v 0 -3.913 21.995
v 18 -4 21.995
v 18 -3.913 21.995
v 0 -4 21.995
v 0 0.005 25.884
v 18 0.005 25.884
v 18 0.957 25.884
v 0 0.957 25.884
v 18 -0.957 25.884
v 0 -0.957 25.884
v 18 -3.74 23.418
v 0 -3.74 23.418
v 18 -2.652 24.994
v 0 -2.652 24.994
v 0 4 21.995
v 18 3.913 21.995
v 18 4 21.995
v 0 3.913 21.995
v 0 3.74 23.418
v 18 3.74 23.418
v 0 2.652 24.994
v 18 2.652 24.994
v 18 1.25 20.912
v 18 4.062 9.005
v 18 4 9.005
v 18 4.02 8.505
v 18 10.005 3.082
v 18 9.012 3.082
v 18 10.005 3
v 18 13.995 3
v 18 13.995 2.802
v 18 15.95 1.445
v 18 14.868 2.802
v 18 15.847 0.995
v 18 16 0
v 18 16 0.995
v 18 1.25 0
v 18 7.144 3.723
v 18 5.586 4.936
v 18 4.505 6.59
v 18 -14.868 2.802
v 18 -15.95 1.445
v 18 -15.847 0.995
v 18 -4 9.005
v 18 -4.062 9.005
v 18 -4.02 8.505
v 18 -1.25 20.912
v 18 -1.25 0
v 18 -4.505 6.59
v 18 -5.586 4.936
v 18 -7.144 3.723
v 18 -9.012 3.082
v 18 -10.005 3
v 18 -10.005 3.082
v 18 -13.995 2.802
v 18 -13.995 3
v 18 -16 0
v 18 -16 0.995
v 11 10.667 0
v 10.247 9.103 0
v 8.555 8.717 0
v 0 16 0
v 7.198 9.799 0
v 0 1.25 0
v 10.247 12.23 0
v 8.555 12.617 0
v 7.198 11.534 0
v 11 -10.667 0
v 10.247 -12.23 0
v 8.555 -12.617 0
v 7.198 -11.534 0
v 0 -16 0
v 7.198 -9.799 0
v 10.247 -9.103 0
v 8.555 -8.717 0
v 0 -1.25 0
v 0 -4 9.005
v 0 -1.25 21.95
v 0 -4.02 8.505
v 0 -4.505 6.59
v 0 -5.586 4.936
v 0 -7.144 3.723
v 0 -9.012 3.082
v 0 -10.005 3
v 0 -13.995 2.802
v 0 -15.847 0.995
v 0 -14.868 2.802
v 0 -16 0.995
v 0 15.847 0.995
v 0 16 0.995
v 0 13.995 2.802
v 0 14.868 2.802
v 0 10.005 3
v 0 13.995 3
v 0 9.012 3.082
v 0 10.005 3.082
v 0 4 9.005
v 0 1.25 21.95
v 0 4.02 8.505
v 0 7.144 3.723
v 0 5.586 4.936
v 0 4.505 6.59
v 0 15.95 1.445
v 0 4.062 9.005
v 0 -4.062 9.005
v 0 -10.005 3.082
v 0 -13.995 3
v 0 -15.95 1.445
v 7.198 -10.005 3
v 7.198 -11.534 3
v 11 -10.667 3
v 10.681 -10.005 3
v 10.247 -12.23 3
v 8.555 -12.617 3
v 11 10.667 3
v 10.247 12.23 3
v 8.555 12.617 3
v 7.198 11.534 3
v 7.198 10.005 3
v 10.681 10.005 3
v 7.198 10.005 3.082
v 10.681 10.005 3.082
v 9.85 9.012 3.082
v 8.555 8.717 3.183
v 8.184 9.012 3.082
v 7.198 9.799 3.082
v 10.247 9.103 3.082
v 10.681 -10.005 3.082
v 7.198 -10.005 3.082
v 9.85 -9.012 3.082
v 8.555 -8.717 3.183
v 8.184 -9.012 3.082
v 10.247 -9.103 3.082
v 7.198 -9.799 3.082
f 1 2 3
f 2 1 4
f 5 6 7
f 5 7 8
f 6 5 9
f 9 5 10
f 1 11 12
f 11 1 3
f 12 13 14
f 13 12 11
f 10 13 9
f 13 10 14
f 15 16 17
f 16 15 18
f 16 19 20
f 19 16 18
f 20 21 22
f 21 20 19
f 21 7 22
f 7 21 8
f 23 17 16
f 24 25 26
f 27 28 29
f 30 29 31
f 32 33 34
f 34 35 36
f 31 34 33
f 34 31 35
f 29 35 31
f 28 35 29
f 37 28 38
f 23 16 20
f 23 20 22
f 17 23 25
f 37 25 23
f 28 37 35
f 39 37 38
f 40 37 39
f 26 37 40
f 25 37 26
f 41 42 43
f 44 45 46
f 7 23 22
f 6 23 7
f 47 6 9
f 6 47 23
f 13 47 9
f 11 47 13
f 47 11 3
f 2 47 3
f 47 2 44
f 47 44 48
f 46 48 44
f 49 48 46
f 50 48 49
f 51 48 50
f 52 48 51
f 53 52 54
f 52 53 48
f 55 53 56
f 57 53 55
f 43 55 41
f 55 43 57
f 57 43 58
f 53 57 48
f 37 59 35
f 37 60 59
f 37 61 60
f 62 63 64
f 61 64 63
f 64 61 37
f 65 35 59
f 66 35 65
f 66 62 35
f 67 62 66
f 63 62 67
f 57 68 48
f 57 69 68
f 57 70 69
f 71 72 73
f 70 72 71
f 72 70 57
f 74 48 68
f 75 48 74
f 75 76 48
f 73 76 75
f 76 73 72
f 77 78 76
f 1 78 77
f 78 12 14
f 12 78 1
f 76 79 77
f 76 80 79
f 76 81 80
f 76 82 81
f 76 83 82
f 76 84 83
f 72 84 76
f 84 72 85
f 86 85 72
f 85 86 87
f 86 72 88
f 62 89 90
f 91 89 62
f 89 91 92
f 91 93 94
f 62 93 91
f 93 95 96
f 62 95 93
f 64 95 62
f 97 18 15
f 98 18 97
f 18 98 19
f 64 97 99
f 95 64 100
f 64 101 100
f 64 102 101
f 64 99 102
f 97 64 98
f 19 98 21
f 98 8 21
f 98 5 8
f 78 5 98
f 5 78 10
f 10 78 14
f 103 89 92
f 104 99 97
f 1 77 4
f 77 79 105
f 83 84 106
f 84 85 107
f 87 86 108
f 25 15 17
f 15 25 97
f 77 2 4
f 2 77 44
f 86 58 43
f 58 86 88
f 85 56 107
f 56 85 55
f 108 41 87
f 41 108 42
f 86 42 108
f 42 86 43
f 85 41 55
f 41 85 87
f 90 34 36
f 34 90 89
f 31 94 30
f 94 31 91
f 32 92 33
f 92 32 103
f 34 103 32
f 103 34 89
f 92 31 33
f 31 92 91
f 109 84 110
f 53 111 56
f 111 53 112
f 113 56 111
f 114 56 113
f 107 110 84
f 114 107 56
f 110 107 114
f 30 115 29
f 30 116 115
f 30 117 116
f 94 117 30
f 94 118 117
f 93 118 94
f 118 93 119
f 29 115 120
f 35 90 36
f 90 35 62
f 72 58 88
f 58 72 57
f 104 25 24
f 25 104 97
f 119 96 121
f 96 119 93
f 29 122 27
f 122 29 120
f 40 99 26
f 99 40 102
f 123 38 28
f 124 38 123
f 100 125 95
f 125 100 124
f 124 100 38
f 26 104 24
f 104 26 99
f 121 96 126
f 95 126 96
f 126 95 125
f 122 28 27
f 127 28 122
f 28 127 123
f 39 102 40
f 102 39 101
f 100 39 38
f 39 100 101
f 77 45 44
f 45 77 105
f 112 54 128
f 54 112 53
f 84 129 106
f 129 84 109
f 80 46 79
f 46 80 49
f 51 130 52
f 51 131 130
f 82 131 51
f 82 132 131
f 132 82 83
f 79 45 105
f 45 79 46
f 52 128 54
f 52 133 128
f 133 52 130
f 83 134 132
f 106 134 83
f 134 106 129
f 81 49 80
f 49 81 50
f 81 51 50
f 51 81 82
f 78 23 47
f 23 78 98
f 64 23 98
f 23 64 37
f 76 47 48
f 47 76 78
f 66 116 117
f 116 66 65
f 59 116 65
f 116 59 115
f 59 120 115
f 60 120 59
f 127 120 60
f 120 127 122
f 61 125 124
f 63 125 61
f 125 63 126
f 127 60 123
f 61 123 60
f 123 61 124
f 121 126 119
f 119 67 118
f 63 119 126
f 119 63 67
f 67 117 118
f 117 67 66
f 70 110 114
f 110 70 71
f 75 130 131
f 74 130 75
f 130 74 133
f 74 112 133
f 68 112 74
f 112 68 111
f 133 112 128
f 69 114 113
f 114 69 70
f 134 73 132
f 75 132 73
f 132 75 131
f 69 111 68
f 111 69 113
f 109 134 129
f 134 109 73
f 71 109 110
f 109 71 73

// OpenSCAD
// Rubbermaid Single Track Bracket Anchor

// Height of slot on largest side
slot_height = 22; // [16:32]

/* [Hidden] */
cap_height = 4;
bracket_angle = 3.3;
bracket_length = 18;
bracket_width = 8;
bracket_height = cap_height + slot_height;
base_height = 3;
base_length = bracket_length;
base_width = bracket_width + 2 *(4 + 4 + 4);

module fillet(r, h) {
    translate([r / 2, r / 2, 0])

        difference() {
            cube([r + 0.01, r + 0.01, h], center = true);

            translate([r/2, r/2, 0])
                cylinder(r = r, h = h + 1, center = true);

        }
}

difference()
{
union(){
difference(){
color("red")
    translate([0,bracket_width/-2,0])
    cube([bracket_length,bracket_width,bracket_height]);

color("red")
    translate([base_length/2 - 0.5, bracket_width/-2, bracket_height])
    rotate([0,90,0])
    fillet(4,bracket_length + 2);
    
color("red")
    translate([base_length/2 - 0.5, bracket_width/2, bracket_height])
    rotate([0,90,180])
    fillet(4,bracket_length + 2);
}

difference(){
color("red")
    translate([0,base_width/-2,0])
    cube([base_length,base_width,base_height]);

color("red")
    translate([base_length/2 - 0.5, base_width/-2, base_height])
    rotate([0,90,0])
    fillet(2,bracket_length + 2);
    
color("red")
    translate([base_length/2 - 0.5, base_width/2, base_height])
    rotate([0,90,180])
    fillet(2,bracket_length + 2);
}

color("red")
    translate([base_length/2, bracket_width/2, base_height])
    rotate([0,-90,0])
    fillet(6,bracket_length);

color("red")
    translate([base_length/2, bracket_width/-2, base_height])
    rotate([0,-90,180])
    fillet(6,bracket_length);
}

color("blue")
    translate([-1.5,2.5/-2,0])
    rotate([0,bracket_angle,0])
    cube([bracket_length + 6,2.5,slot_height]);

color("green")
    translate([base_length / 2, base_width/3,-1])
    cylinder(r = 2, h = 5);

color("green")
    translate([base_length / 2, base_width/-3,-1])
    cylinder(r = 2, h = 5);
}

    
/*
// Use this to measure since ruler isn't available
color("orange")
    translate([bracket_length,0,0])
    cube([18,18,23]);
*/
